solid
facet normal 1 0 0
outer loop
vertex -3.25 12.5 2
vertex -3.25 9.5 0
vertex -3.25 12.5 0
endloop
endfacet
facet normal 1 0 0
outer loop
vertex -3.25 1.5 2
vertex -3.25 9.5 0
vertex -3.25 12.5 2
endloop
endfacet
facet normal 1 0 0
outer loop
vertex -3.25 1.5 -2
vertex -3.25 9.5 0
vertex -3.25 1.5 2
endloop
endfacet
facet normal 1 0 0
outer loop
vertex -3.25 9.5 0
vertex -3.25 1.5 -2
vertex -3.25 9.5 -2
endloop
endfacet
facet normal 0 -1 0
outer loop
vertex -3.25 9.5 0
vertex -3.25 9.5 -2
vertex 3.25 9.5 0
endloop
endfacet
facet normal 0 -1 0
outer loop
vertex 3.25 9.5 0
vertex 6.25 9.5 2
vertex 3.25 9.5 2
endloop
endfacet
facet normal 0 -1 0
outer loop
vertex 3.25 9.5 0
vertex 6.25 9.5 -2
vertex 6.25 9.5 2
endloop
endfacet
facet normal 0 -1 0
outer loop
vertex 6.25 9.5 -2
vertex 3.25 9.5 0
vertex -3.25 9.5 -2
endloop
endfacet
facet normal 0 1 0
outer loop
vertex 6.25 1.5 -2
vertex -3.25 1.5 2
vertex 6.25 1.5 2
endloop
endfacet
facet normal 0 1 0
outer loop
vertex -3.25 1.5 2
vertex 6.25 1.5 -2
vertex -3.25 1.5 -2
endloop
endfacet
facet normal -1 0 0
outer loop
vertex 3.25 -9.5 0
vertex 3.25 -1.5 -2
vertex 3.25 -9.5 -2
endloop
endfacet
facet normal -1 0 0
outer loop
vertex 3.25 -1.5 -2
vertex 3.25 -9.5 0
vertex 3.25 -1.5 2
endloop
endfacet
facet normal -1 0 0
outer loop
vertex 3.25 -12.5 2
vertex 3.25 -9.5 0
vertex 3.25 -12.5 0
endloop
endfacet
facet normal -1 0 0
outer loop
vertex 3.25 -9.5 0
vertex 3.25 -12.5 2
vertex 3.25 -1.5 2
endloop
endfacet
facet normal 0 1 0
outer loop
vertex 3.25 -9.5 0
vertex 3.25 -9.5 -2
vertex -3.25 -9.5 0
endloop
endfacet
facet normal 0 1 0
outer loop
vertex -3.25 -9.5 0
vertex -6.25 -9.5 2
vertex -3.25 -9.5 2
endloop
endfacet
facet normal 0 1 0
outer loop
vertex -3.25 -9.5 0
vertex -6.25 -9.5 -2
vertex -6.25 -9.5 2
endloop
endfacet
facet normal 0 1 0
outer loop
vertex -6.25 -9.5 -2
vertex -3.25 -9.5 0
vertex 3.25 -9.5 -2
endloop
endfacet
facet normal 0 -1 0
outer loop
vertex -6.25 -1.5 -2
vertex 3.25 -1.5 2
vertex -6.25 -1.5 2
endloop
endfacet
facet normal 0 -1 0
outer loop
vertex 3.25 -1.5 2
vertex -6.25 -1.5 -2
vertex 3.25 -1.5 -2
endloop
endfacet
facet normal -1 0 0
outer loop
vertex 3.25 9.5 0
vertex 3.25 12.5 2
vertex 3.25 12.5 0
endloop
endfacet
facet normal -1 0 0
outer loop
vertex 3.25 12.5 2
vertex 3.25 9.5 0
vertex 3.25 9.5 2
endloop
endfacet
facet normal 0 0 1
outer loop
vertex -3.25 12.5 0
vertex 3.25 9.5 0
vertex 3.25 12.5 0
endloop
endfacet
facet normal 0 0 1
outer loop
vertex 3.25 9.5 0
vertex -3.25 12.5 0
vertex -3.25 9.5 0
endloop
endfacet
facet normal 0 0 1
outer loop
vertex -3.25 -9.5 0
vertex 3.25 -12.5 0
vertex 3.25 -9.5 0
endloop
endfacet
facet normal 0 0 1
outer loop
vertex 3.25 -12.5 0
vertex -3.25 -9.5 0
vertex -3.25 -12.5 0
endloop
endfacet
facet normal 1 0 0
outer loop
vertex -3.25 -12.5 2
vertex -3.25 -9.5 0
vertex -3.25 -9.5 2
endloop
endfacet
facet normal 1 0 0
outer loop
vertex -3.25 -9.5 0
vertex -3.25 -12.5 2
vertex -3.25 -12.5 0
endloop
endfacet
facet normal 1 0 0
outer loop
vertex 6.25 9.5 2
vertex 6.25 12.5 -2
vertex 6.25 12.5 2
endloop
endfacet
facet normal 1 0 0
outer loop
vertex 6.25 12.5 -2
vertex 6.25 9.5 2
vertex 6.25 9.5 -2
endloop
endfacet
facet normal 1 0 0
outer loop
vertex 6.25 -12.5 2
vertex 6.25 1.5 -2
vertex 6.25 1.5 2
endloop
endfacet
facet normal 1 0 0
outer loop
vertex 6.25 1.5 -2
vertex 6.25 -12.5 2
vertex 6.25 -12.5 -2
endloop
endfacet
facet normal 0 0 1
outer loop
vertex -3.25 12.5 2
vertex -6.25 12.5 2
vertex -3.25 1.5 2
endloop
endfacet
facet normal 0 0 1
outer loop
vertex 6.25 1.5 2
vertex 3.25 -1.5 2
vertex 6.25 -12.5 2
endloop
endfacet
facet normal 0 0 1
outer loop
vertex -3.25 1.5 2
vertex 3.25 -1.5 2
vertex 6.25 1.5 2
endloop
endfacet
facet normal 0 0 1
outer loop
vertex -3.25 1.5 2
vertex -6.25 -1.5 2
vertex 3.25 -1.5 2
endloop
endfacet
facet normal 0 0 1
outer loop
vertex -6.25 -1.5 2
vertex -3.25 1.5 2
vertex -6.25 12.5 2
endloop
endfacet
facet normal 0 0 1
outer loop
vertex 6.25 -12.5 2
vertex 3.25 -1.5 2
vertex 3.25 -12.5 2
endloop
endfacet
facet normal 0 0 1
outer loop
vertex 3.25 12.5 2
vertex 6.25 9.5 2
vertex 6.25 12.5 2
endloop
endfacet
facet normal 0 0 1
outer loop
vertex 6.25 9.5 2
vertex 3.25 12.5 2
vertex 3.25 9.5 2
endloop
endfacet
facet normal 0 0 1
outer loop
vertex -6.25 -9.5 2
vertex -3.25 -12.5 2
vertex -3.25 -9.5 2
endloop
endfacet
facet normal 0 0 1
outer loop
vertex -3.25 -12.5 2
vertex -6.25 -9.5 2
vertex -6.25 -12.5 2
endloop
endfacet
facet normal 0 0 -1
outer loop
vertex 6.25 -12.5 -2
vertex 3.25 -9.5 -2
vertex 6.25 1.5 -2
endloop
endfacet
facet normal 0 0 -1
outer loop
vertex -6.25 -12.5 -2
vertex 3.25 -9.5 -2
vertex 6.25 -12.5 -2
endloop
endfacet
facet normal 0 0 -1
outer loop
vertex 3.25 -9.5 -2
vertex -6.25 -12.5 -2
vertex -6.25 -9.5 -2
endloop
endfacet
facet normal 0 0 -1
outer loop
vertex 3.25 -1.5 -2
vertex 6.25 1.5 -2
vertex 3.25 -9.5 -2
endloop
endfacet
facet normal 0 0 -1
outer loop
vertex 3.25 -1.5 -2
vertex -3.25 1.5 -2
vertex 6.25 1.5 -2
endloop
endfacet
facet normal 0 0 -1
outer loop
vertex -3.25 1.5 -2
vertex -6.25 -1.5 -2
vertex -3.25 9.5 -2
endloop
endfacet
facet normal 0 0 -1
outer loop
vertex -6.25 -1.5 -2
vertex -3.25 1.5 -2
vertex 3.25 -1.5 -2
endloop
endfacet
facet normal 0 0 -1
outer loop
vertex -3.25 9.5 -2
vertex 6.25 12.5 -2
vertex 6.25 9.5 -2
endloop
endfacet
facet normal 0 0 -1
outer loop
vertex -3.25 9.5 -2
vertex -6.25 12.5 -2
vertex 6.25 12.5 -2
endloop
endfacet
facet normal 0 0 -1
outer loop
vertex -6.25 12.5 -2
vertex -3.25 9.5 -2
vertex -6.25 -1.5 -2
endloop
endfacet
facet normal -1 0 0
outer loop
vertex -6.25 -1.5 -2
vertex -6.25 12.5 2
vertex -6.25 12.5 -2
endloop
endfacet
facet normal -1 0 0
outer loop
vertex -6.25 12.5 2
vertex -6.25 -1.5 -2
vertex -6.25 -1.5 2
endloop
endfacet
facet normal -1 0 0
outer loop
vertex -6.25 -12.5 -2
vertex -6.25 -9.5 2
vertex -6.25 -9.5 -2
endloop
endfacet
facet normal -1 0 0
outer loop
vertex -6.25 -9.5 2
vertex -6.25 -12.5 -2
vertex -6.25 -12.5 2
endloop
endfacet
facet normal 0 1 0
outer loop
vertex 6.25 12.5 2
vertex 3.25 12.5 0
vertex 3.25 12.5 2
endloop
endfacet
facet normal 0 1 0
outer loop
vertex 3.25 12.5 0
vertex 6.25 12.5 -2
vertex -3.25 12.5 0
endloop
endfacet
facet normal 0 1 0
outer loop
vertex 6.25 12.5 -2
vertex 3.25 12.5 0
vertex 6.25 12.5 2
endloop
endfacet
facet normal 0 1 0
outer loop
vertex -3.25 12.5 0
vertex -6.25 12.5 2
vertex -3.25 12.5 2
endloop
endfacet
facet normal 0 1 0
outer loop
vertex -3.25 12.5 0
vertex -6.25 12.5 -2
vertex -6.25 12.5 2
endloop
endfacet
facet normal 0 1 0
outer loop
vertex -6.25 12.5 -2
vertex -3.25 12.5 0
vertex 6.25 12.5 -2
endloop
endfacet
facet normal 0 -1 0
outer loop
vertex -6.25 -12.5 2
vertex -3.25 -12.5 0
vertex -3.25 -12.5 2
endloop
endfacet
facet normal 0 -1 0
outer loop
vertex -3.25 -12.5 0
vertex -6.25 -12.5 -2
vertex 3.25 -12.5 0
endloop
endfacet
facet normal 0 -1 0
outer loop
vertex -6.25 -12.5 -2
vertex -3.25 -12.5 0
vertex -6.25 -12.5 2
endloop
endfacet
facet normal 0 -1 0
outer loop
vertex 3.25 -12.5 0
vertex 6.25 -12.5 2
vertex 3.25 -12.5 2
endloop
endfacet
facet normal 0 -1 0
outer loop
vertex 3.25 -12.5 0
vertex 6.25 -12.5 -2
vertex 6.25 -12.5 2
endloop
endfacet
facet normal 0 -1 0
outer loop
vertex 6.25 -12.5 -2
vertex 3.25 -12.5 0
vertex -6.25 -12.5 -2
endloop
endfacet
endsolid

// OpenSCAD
// 
// source: http://www.thingiverse.com/thing:10082
// made for customizer
// alexander@nischelwitzer.com
//


  //////////////////////////
 // Customizer Settings: //
//////////////////////////

// How long should the belt-tension be? (mm)
tensionLength   = 25;  // [20:50]

// How thick should the tension be? (mm) 
tensionThick = 4; // [2:10]

// How large is the belt width? (1/10 mm)
beltWidth = 65; // [30:100]


// How deep is the notch? (mm)
notchDepth = 2; // [1:10]

  //////////////////////
 // Static Settings: //
//////////////////////

module GoAwayCustomizer() {
// This module is here to stop Customizer from picking up the variables below
}

// ---------------------------------------------------


beltTensioner(beltWidth/10, 3, tensionLength, tensionThick, notchDepth);



module beltTensioner(belt_width, post_width, length, thickness, notch_depth)
{
	module _beltTensioner(width, length, thickness, post_width, notch_depth)
	{
		cutout_width = width - post_width + 2;
		cutout_length = (length - post_width * 3) / 2;
		cutout_thickness = thickness + 6;

		notch_width = width - post_width * 2;
		module cutout()
		{
			translate([post_width / 2 + 1, length / 2 - cutout_length / 2 - post_width, 0])
			{
				cube([cutout_width, cutout_length, cutout_thickness], center=true);
			}
		}
	
		module notch_cutout()
		{
			translate([0,  length / 2 - post_width / 2, thickness / 2 - notch_depth / 2 + 1])
			{
				cube([notch_width, post_width + 2, notch_depth + 2], center= true);
			}
		}
		difference()
		{
			// Main body	
			cube([width, length, thickness], center=true);
	
			// Notches for "S" shape
			union()
			{
					cutout ();
					mirror([1, 0, 0])
					{
						mirror([0, 1, 0])
						{
							cutout ();
						}
					}
	
					// Notches for belt guide
					notch_cutout();
					mirror([0, 1, 0])
					{
						notch_cutout();
					}
			}
		}
	}
	_beltTensioner(belt_width + post_width * 2, length, thickness, post_width, notch_depth);
}
